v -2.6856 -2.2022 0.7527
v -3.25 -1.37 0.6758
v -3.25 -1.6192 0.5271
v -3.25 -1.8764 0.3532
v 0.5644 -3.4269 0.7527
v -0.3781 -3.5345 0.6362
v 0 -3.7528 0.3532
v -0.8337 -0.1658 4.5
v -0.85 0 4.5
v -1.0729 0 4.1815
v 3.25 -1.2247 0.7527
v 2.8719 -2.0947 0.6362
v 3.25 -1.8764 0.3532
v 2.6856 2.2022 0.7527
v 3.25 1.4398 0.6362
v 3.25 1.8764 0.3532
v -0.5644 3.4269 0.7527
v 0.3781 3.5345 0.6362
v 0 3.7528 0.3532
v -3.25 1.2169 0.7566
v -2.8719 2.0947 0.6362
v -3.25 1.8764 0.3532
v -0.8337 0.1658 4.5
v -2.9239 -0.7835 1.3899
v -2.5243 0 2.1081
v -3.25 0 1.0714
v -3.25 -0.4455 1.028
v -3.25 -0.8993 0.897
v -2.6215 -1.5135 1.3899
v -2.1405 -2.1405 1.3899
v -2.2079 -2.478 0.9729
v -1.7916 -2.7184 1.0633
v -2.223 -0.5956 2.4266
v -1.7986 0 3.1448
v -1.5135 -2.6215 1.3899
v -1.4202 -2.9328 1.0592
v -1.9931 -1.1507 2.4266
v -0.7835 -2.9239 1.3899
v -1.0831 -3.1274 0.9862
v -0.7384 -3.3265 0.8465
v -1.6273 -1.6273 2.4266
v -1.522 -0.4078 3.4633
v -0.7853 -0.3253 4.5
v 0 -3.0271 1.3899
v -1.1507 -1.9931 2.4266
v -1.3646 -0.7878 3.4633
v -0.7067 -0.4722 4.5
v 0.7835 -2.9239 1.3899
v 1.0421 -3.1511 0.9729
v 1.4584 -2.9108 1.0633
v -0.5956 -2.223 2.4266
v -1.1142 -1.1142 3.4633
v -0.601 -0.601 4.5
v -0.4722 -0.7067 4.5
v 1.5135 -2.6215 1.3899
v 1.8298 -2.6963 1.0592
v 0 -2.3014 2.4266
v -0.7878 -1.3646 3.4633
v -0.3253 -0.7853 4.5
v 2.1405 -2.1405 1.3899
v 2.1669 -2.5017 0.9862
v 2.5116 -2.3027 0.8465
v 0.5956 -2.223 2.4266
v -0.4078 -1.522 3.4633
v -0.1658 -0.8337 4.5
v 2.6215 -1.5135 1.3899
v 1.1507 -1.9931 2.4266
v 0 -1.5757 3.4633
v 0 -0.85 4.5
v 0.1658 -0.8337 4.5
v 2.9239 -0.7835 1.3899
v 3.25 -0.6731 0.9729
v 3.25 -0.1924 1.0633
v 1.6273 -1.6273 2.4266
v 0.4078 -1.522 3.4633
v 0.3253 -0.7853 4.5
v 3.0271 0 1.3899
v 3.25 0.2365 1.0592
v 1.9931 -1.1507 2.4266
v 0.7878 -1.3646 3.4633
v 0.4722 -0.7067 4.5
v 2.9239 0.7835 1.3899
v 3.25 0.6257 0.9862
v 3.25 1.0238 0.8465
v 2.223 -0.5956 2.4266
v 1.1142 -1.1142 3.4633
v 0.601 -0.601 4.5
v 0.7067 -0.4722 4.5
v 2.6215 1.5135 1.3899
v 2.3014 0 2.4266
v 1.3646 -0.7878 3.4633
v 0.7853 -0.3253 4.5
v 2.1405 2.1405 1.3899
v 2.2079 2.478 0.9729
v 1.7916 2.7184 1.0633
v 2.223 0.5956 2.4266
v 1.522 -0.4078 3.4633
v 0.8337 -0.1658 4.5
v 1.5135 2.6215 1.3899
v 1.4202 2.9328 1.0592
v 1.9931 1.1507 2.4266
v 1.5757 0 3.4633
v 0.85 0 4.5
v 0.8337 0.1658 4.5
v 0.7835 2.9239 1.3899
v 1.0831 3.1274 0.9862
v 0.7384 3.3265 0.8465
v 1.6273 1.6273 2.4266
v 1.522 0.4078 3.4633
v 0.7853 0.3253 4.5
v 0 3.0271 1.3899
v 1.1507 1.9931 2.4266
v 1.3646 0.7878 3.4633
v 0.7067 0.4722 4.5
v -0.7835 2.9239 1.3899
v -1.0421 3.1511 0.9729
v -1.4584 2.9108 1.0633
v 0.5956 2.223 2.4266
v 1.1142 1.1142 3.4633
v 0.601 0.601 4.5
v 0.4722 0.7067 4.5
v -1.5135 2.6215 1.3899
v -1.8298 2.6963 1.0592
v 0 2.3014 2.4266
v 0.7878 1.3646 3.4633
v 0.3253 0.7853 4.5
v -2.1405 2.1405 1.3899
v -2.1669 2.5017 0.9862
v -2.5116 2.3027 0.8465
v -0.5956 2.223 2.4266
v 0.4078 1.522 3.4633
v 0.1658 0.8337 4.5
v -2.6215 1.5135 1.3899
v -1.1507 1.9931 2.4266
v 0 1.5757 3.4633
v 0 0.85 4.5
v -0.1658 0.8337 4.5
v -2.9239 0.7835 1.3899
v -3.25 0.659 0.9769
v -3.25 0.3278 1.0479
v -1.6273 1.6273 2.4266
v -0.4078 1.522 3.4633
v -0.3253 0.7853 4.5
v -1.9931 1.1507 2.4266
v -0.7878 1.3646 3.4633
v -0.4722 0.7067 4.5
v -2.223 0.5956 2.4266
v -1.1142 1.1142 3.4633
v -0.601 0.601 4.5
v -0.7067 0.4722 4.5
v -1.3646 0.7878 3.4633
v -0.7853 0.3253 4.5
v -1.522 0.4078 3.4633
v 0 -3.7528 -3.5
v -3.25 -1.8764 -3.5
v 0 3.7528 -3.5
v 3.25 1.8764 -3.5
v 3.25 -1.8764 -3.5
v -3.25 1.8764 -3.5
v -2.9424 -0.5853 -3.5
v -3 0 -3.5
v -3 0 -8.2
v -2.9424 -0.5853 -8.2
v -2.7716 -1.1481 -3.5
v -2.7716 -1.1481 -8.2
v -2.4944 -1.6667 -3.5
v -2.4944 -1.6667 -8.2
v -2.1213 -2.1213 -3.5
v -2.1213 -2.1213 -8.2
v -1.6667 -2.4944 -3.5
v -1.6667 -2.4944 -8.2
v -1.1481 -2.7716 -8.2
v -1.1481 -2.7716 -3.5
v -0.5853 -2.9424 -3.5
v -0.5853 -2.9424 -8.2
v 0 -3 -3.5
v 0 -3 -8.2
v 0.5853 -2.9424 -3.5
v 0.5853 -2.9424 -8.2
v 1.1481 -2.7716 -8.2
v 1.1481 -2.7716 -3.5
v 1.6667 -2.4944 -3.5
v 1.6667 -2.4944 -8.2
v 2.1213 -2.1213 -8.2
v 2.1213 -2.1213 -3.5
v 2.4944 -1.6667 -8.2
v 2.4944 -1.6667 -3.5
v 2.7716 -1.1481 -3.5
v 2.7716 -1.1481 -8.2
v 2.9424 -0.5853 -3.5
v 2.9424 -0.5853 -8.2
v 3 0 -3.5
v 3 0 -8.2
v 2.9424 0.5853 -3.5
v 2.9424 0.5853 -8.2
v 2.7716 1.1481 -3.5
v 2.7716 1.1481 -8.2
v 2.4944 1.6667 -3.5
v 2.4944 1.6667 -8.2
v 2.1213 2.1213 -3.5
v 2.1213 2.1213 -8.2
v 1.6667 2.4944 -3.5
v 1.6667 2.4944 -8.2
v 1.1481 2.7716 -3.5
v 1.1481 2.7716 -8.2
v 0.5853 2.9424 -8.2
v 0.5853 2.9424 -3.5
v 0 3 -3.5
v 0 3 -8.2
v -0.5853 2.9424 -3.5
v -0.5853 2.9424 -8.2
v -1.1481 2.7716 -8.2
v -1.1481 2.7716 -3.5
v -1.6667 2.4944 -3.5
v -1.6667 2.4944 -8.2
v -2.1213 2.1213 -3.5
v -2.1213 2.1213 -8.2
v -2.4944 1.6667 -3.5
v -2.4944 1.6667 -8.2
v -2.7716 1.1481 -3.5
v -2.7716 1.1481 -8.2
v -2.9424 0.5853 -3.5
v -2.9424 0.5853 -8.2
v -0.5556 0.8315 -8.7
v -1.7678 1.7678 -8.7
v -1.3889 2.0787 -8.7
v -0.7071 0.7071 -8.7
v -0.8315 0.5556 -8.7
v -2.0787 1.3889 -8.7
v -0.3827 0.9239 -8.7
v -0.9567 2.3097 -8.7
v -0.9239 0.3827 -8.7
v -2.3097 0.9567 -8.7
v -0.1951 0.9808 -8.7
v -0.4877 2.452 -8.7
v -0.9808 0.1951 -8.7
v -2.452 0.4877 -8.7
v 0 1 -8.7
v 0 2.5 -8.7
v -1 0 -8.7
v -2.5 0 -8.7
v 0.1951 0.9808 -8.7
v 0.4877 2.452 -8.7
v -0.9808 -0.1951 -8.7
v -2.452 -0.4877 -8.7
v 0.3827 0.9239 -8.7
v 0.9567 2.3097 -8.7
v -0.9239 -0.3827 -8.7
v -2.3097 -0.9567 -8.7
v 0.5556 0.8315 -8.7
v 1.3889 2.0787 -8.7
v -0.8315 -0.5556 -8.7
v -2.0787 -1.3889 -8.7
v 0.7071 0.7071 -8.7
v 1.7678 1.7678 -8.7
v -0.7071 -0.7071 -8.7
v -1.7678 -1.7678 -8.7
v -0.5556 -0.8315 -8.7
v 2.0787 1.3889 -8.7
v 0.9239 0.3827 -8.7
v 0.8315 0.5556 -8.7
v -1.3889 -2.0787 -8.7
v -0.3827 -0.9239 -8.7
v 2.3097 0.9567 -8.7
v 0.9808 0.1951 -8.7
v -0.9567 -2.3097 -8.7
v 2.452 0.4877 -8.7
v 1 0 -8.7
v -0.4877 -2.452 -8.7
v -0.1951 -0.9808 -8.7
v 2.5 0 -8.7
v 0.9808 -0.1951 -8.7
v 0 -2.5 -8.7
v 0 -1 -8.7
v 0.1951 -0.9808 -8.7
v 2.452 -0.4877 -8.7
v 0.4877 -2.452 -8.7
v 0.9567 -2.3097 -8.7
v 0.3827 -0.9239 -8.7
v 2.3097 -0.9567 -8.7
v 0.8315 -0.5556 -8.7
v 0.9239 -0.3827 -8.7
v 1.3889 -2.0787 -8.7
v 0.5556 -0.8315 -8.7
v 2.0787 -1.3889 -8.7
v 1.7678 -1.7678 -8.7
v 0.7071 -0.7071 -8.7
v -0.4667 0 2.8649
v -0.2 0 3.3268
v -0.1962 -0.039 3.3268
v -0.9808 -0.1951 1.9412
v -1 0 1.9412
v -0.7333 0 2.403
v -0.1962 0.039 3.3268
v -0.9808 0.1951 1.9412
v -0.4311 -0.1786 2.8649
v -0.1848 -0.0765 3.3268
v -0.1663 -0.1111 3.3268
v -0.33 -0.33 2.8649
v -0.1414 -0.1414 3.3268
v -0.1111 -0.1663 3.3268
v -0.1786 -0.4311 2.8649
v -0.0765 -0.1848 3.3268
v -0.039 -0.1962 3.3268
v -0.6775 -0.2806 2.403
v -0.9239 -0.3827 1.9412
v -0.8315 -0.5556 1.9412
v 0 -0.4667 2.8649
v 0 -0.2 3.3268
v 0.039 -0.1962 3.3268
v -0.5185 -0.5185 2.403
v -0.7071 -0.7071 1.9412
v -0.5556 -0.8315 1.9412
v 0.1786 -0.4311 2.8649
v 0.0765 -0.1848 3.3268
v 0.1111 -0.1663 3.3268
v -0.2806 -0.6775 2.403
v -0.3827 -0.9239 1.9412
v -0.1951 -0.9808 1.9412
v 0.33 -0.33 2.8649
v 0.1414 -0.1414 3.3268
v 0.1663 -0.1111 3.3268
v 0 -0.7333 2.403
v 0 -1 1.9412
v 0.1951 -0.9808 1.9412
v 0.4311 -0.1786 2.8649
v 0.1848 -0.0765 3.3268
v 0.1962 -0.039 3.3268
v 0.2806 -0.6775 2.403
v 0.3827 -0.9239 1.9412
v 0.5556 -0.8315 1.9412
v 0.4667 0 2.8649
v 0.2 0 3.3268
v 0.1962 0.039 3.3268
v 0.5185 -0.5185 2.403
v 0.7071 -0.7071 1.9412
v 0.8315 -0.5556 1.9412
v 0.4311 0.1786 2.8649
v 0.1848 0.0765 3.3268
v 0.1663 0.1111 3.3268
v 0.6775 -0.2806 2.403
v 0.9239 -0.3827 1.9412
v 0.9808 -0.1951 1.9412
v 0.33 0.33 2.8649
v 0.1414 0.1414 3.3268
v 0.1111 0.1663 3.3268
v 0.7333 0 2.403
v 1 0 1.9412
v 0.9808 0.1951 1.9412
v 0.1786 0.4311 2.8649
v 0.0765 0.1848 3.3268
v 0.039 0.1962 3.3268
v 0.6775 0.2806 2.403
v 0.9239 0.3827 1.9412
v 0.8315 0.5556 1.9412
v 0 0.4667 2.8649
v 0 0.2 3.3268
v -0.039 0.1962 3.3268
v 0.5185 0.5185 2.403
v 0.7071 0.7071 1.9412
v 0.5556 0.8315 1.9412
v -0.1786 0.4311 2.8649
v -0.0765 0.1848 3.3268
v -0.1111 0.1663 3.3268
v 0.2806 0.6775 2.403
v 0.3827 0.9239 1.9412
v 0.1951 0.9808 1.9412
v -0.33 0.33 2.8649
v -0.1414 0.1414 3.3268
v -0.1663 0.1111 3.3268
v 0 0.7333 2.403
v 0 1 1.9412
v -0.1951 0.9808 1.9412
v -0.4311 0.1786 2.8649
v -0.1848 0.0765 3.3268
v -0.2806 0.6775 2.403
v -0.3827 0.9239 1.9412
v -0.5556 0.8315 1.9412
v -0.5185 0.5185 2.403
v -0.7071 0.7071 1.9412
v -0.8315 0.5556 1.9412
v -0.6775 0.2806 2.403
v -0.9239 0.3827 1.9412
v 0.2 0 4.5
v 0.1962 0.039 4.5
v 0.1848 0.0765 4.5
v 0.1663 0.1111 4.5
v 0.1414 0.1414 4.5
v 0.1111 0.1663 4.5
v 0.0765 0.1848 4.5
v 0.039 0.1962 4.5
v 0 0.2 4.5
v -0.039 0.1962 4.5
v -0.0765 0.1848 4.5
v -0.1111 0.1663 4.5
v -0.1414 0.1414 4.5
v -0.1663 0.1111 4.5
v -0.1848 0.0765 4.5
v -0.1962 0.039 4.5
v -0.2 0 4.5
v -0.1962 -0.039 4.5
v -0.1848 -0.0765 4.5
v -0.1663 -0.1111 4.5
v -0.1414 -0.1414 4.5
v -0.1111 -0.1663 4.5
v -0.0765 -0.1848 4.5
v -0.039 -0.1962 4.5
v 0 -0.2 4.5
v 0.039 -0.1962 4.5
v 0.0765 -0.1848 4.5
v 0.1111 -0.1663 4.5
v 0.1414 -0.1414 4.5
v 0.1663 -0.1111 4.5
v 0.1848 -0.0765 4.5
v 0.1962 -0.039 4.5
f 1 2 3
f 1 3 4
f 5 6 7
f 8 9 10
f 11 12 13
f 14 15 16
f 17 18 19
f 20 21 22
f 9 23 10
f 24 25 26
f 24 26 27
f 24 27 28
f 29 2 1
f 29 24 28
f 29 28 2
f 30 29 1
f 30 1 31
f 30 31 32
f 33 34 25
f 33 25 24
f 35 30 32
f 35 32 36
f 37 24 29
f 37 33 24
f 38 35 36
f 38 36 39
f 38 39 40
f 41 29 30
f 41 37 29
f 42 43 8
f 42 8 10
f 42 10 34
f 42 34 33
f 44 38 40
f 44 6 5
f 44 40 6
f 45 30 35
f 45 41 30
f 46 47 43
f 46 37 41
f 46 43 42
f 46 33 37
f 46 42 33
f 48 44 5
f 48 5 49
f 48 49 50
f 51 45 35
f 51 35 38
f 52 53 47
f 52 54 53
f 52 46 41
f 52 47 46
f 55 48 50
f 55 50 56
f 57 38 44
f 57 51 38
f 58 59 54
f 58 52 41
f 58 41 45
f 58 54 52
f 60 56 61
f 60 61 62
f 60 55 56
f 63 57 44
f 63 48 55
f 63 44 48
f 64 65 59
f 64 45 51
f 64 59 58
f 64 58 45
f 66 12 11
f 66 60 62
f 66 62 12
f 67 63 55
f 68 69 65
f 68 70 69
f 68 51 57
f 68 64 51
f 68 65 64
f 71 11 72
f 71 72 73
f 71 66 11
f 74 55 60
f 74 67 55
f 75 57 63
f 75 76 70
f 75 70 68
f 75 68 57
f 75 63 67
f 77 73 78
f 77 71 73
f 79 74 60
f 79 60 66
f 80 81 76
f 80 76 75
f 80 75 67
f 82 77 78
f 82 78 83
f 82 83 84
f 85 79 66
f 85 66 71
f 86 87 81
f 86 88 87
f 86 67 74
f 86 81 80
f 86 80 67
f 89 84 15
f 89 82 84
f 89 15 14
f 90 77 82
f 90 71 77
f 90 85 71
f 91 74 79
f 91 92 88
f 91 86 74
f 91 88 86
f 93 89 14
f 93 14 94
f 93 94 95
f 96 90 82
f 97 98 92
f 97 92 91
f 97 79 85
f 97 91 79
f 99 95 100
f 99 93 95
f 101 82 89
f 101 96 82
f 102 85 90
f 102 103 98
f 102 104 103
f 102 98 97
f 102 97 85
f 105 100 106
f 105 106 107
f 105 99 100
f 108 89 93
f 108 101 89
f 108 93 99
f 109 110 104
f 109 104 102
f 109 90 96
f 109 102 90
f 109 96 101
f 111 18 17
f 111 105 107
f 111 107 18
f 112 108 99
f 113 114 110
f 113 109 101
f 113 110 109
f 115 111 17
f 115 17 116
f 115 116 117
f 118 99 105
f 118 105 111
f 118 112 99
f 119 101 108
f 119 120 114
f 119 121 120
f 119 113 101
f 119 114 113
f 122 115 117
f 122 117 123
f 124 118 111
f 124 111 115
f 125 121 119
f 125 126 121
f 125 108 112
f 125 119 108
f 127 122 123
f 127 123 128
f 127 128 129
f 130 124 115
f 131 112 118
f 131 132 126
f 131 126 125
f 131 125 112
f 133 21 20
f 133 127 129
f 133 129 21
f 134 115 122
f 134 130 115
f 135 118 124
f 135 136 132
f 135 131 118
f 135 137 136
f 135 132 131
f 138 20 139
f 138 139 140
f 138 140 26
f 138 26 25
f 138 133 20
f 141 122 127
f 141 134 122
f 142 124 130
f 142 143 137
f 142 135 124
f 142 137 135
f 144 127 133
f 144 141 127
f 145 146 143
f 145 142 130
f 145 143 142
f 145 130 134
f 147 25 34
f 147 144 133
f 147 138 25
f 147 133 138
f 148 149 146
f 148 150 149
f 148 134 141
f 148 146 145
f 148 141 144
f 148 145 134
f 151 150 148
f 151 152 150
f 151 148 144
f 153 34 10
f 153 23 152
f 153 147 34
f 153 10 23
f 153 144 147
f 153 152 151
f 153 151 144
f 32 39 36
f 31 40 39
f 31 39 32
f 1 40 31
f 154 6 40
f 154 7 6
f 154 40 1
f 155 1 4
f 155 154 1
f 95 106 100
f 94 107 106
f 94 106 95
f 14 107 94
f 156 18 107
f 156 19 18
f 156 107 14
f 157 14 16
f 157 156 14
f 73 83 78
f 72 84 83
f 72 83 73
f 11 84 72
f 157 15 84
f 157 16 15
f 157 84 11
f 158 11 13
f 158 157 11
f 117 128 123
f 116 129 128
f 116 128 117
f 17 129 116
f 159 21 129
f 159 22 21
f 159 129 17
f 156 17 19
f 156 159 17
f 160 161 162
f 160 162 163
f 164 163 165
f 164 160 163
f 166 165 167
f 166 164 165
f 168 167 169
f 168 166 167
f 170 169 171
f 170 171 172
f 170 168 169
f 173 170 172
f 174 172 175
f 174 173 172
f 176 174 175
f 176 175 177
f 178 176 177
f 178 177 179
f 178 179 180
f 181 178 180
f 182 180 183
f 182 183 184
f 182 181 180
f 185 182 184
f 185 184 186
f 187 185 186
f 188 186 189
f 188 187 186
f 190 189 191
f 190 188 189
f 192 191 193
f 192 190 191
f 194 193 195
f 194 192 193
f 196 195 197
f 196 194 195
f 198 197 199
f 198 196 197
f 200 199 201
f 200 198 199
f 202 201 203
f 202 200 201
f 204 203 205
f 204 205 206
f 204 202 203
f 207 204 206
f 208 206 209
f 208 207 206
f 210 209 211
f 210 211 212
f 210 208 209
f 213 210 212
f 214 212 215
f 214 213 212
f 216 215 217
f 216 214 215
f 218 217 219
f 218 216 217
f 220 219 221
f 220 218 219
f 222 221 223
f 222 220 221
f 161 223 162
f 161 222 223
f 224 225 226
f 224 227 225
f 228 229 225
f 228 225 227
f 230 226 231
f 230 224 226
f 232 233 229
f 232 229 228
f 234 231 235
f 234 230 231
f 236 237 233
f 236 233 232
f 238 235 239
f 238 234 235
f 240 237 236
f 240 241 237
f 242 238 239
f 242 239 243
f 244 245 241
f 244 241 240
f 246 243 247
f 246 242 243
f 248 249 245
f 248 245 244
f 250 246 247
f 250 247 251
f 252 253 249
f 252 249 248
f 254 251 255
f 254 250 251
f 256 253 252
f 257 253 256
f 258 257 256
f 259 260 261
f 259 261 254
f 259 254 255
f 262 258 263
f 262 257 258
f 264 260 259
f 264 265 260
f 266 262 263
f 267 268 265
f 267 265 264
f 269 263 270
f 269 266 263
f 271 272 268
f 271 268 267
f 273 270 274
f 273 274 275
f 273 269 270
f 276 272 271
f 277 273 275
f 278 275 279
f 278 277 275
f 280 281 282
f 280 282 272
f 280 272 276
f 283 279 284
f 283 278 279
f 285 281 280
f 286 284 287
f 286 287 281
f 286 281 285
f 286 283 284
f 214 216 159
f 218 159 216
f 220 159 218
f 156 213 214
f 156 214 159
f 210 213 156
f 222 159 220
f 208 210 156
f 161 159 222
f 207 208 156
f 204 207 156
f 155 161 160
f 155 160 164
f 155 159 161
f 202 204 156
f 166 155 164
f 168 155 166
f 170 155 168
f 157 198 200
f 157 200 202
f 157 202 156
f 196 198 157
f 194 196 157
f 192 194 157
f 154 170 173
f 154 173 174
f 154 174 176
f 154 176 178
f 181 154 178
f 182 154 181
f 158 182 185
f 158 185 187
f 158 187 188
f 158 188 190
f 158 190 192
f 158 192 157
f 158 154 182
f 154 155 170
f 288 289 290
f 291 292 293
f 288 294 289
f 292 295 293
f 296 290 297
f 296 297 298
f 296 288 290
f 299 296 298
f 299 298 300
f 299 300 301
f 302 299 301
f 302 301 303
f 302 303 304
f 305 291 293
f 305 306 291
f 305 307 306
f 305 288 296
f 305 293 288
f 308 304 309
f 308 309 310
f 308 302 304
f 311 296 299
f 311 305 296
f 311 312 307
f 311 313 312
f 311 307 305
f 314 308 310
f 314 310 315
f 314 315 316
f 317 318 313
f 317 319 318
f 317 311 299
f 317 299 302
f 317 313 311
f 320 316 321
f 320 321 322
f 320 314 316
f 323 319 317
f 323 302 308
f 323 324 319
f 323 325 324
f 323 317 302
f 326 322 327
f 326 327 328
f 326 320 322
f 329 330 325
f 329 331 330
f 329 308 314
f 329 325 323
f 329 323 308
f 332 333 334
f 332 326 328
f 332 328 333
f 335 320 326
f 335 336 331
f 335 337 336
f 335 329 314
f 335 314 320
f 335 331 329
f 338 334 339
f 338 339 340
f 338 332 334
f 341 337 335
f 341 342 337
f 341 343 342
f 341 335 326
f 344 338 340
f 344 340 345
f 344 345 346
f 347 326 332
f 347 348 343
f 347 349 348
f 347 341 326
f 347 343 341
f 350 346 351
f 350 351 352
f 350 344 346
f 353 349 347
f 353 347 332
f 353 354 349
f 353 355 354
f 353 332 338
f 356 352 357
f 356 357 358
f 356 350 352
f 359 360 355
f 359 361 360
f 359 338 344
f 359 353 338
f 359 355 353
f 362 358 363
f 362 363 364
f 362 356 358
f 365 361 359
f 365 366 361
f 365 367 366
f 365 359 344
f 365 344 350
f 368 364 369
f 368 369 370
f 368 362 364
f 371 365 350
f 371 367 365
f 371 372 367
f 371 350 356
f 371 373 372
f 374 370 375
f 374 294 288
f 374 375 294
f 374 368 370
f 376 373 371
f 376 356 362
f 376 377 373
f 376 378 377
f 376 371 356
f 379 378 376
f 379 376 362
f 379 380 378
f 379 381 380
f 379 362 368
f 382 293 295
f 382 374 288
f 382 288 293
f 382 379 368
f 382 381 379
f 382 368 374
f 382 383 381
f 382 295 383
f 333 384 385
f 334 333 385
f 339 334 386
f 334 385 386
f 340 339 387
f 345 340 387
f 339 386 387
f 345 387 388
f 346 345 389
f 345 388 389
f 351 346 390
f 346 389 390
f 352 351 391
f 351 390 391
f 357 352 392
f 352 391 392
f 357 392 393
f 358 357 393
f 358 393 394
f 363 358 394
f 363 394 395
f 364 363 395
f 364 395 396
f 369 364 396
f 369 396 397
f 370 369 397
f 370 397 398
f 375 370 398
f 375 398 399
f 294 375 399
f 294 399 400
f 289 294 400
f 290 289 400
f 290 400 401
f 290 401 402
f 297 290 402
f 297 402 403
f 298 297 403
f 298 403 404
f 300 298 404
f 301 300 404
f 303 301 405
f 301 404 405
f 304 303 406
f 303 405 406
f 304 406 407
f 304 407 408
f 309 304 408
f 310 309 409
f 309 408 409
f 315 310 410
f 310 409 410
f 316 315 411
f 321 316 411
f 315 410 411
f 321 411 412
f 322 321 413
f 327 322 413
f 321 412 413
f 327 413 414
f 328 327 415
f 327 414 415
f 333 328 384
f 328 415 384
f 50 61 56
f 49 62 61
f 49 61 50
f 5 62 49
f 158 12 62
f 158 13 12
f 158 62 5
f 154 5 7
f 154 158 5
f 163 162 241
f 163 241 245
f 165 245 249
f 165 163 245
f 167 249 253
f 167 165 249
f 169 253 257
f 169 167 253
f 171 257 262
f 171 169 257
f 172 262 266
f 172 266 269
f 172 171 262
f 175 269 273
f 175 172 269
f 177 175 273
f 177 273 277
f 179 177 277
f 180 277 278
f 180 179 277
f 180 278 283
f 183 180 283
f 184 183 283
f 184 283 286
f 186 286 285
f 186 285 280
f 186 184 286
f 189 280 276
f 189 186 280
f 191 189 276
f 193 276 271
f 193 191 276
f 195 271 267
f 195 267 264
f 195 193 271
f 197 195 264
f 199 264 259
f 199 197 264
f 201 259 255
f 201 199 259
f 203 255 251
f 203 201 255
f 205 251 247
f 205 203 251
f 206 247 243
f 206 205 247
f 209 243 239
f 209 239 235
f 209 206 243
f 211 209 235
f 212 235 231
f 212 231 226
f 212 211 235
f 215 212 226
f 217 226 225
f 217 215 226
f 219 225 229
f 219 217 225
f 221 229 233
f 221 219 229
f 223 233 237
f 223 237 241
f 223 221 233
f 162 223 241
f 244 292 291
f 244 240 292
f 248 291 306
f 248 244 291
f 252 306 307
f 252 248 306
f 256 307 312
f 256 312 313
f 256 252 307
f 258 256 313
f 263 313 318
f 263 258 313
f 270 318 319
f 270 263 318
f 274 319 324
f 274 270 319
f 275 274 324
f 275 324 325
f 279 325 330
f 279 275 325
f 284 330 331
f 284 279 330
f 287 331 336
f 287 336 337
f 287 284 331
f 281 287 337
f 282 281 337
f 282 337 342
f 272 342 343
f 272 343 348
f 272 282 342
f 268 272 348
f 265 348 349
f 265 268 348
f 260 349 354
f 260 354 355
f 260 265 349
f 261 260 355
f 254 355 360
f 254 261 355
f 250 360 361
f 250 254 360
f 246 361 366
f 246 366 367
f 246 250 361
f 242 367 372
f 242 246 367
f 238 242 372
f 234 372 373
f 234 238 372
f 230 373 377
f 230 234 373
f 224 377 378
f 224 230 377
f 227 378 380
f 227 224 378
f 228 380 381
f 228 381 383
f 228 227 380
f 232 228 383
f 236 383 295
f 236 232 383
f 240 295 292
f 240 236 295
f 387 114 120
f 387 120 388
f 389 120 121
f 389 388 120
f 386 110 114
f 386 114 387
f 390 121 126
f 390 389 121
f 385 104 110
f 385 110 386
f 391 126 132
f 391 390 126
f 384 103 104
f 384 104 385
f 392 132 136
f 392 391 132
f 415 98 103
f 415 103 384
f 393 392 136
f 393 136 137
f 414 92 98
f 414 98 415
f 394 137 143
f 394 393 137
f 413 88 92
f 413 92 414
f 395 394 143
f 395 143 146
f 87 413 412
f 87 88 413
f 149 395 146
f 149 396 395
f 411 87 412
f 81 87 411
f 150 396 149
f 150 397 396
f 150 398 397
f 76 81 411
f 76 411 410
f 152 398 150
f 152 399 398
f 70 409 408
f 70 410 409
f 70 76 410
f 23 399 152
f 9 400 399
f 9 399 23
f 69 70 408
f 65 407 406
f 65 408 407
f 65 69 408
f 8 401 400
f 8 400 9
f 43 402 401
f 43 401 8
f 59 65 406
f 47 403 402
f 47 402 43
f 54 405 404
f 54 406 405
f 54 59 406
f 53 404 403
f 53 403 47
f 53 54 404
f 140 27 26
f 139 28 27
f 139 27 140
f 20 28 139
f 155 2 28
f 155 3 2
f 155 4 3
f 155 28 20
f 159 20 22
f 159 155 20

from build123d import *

# Parameters (mm, degrees)
SKETCH2_OUTSIDE_W  = 13.478
SKETCH2_OUTSIDE_H  = 13.478
CUT_EXTRUDE2_DEPTH = 10
CHAMFER1_SIZE      = 0.5
SKETCH3_R          = 0.2
CUT_EXTRUDE3_DEPTH = 15.102688869


with BuildPart() as part:
    # Sketch1 → Revolve1 (revolve)
    with BuildSketch(Plane(origin=(0, 0, 0), x_dir=(1, 0, 0), z_dir=(0, 1, 0)), mode=Mode.PRIVATE) as revolve1_sk:
        Polygon((1, 8.7), (3, 8.7), (3, 3.5), (4, 3.5), (4, 0), (0.85, -4.5), (0, -4.5), (0, -3.673205081), (1, -1.941154273), align=None)
    revolve(revolve1_sk.sketch.rotate(Axis((0, 0, 0), (0, 0, 1)), 180), axis=Axis((0, 0, 0), (0, 0, 1)))

    # Sketch2 outside → Cut-Extrude2 (cut)
    with BuildSketch(Plane(origin=(0, 0, -3.5), x_dir=(-1, 0, 0), z_dir=(0, 0, -1))):
        Rectangle(SKETCH2_OUTSIDE_W, SKETCH2_OUTSIDE_H)
        Polygon((3.25, 1.876388375), (0, 3.75277675), (-3.25, 1.876388375), (-3.25, -1.876388375), (0, -3.75277675), (3.25, -1.876388375), align=None, mode=Mode.SUBTRACT)
    extrude(amount=-CUT_EXTRUDE2_DEPTH, mode=Mode.SUBTRACT)

    # Chamfer1
    chamfer1_edges = [part.edges().sort_by_distance(p)[0] for p in [
        (3, 0, -8.7),
    ]]
    chamfer(chamfer1_edges, length=CHAMFER1_SIZE)

    # Sketch3 → Cut-Extrude3 (cut, through all)
    with BuildSketch(Plane.XY.offset(4.5)):
        Circle(SKETCH3_R)
    extrude(amount=-CUT_EXTRUDE3_DEPTH, mode=Mode.SUBTRACT)


solid = part.part
